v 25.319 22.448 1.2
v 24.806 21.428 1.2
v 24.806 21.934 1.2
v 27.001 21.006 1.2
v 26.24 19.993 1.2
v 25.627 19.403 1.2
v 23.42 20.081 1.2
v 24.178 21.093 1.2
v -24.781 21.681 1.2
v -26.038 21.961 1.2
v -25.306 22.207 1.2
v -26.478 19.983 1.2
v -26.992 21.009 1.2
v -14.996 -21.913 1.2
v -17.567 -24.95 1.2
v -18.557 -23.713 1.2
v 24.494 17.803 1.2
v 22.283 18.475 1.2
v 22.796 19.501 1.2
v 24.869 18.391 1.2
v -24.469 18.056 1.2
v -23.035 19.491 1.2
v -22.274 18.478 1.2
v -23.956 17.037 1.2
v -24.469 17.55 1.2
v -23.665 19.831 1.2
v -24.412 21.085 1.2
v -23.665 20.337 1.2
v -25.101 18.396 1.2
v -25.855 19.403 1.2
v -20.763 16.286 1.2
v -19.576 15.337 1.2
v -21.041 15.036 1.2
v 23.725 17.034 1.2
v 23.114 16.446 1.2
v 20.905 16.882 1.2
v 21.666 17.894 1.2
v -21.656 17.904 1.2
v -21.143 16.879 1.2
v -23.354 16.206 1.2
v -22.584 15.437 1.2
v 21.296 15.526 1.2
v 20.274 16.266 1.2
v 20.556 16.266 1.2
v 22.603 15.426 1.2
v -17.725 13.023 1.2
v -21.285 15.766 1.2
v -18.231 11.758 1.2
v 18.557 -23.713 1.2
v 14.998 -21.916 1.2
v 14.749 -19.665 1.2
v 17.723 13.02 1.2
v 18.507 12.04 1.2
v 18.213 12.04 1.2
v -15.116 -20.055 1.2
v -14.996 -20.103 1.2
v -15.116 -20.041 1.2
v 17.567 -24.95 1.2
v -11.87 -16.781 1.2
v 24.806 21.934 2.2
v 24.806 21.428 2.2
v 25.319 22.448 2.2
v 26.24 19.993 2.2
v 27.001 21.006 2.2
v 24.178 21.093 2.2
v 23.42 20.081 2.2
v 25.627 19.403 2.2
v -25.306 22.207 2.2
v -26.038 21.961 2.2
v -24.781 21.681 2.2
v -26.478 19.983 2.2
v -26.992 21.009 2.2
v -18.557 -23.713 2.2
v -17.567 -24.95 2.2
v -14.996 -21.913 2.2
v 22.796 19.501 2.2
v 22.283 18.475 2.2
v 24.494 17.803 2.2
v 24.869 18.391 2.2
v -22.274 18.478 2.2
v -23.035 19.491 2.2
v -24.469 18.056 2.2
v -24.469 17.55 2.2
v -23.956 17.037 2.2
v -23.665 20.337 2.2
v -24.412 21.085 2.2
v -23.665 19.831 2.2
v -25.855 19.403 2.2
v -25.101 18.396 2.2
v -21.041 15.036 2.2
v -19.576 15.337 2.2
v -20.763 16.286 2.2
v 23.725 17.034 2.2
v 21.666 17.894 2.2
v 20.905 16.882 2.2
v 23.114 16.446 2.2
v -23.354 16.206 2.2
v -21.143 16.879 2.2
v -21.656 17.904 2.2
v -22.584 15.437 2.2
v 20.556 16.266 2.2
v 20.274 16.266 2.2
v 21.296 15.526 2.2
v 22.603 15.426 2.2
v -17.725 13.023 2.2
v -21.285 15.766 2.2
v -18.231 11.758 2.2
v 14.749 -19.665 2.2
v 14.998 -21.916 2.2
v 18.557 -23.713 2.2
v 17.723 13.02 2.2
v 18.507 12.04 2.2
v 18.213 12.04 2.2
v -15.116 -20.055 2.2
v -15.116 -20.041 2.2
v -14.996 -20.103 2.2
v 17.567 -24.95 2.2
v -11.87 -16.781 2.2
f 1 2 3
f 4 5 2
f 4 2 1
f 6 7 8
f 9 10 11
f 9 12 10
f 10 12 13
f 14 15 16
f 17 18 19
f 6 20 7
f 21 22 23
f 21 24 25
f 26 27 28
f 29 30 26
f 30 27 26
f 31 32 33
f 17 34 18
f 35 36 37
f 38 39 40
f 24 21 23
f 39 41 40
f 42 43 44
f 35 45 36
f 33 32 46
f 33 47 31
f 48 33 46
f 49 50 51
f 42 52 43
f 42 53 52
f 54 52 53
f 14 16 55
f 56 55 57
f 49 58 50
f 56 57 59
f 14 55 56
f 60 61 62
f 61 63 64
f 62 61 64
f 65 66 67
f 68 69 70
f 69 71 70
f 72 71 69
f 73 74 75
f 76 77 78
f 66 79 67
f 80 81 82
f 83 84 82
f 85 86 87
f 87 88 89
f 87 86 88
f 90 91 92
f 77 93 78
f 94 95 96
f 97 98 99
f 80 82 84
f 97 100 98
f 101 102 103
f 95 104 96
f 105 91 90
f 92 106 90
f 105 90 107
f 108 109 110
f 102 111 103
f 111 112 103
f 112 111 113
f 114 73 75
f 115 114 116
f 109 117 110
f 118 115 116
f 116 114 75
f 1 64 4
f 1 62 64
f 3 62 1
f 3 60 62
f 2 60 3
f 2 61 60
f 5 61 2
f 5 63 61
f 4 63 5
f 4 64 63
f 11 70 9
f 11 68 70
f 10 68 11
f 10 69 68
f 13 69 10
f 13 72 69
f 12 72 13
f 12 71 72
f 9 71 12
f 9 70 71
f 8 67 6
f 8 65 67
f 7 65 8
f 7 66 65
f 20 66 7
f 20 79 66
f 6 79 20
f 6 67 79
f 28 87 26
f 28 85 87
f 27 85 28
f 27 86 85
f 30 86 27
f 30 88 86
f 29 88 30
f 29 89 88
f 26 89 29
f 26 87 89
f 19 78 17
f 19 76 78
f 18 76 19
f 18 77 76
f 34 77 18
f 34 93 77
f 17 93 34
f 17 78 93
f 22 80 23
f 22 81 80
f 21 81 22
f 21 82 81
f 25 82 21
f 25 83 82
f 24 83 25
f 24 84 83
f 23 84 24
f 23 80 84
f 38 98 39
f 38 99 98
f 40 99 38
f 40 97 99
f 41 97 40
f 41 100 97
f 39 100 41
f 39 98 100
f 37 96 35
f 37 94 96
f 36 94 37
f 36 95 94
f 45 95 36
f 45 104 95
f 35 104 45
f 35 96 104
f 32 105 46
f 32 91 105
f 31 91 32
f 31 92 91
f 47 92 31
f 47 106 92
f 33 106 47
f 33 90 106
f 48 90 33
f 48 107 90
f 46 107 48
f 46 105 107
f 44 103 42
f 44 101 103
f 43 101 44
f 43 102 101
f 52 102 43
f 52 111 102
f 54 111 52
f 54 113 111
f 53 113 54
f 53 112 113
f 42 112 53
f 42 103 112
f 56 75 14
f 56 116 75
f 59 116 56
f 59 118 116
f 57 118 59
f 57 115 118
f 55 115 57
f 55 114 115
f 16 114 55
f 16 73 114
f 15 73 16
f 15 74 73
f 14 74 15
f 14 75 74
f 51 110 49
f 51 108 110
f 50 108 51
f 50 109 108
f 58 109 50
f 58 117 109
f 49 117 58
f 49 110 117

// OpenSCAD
$fn = 24;
translate([0, -2.500, 1.200])
  linear_extrude(height=1.000) {
offset(delta=0.06) {
    polygon(points=[[14.828,-17.337],[15.056,-19.391],[17.566,-22.356],[18.478,-21.216]], paths=[[0,1,2,3]]);
    polygon(points=[[-14.828,-17.337],[-18.478,-21.216],[-17.566,-22.356],[-15.056,-19.391],[-15.056,-17.566]], paths=[[0,1,2,3,4]]);
    polygon(points=[[20.531,18.706],[20.303,18.706],[17.794,15.513],[18.250,14.600],[18.478,14.600],[21.216,18.022]], paths=[[0,1,2,3,4,5]]);
    polygon(points=[[-20.759,18.706],[-21.216,18.250],[-20.988,17.566],[-18.250,14.372],[-17.794,15.513],[-19.619,17.794]], paths=[[0,1,2,3,4,5]]);
    polygon(points=[[21.672,20.303],[20.987,19.391],[22.584,18.022],[23.041,18.934]], paths=[[0,1,2,3]]);
    polygon(points=[[-21.672,20.303],[-23.269,18.706],[-22.584,18.022],[-21.216,19.391]], paths=[[0,1,2,3]]);
    polygon(points=[[22.812,21.900],[22.356,20.987],[23.725,19.619],[24.409,20.303]], paths=[[0,1,2,3]]);
    polygon(points=[[-23.041,21.900],[-24.409,20.531],[-24.409,20.075],[-23.953,19.619],[-22.356,20.987]], paths=[[0,1,2,3,4]]);
    polygon(points=[[24.181,23.497],[23.497,22.584],[24.866,20.987],[25.550,21.900]], paths=[[0,1,2,3]]);
    polygon(points=[[-24.409,23.497],[-25.778,21.900],[-25.094,20.987],[-23.725,22.356],[-23.725,22.812]], paths=[[0,1,2,3,4]]);
    polygon(points=[[-25.322,24.638],[-26.006,24.409],[-26.919,23.497],[-26.462,22.584],[-24.866,24.181]], paths=[[0,1,2,3,4]]);
    polygon(points=[[25.322,24.866],[24.866,24.409],[24.866,23.953],[26.234,22.584],[26.919,23.497]], paths=[[0,1,2,3,4]]);
}
}
